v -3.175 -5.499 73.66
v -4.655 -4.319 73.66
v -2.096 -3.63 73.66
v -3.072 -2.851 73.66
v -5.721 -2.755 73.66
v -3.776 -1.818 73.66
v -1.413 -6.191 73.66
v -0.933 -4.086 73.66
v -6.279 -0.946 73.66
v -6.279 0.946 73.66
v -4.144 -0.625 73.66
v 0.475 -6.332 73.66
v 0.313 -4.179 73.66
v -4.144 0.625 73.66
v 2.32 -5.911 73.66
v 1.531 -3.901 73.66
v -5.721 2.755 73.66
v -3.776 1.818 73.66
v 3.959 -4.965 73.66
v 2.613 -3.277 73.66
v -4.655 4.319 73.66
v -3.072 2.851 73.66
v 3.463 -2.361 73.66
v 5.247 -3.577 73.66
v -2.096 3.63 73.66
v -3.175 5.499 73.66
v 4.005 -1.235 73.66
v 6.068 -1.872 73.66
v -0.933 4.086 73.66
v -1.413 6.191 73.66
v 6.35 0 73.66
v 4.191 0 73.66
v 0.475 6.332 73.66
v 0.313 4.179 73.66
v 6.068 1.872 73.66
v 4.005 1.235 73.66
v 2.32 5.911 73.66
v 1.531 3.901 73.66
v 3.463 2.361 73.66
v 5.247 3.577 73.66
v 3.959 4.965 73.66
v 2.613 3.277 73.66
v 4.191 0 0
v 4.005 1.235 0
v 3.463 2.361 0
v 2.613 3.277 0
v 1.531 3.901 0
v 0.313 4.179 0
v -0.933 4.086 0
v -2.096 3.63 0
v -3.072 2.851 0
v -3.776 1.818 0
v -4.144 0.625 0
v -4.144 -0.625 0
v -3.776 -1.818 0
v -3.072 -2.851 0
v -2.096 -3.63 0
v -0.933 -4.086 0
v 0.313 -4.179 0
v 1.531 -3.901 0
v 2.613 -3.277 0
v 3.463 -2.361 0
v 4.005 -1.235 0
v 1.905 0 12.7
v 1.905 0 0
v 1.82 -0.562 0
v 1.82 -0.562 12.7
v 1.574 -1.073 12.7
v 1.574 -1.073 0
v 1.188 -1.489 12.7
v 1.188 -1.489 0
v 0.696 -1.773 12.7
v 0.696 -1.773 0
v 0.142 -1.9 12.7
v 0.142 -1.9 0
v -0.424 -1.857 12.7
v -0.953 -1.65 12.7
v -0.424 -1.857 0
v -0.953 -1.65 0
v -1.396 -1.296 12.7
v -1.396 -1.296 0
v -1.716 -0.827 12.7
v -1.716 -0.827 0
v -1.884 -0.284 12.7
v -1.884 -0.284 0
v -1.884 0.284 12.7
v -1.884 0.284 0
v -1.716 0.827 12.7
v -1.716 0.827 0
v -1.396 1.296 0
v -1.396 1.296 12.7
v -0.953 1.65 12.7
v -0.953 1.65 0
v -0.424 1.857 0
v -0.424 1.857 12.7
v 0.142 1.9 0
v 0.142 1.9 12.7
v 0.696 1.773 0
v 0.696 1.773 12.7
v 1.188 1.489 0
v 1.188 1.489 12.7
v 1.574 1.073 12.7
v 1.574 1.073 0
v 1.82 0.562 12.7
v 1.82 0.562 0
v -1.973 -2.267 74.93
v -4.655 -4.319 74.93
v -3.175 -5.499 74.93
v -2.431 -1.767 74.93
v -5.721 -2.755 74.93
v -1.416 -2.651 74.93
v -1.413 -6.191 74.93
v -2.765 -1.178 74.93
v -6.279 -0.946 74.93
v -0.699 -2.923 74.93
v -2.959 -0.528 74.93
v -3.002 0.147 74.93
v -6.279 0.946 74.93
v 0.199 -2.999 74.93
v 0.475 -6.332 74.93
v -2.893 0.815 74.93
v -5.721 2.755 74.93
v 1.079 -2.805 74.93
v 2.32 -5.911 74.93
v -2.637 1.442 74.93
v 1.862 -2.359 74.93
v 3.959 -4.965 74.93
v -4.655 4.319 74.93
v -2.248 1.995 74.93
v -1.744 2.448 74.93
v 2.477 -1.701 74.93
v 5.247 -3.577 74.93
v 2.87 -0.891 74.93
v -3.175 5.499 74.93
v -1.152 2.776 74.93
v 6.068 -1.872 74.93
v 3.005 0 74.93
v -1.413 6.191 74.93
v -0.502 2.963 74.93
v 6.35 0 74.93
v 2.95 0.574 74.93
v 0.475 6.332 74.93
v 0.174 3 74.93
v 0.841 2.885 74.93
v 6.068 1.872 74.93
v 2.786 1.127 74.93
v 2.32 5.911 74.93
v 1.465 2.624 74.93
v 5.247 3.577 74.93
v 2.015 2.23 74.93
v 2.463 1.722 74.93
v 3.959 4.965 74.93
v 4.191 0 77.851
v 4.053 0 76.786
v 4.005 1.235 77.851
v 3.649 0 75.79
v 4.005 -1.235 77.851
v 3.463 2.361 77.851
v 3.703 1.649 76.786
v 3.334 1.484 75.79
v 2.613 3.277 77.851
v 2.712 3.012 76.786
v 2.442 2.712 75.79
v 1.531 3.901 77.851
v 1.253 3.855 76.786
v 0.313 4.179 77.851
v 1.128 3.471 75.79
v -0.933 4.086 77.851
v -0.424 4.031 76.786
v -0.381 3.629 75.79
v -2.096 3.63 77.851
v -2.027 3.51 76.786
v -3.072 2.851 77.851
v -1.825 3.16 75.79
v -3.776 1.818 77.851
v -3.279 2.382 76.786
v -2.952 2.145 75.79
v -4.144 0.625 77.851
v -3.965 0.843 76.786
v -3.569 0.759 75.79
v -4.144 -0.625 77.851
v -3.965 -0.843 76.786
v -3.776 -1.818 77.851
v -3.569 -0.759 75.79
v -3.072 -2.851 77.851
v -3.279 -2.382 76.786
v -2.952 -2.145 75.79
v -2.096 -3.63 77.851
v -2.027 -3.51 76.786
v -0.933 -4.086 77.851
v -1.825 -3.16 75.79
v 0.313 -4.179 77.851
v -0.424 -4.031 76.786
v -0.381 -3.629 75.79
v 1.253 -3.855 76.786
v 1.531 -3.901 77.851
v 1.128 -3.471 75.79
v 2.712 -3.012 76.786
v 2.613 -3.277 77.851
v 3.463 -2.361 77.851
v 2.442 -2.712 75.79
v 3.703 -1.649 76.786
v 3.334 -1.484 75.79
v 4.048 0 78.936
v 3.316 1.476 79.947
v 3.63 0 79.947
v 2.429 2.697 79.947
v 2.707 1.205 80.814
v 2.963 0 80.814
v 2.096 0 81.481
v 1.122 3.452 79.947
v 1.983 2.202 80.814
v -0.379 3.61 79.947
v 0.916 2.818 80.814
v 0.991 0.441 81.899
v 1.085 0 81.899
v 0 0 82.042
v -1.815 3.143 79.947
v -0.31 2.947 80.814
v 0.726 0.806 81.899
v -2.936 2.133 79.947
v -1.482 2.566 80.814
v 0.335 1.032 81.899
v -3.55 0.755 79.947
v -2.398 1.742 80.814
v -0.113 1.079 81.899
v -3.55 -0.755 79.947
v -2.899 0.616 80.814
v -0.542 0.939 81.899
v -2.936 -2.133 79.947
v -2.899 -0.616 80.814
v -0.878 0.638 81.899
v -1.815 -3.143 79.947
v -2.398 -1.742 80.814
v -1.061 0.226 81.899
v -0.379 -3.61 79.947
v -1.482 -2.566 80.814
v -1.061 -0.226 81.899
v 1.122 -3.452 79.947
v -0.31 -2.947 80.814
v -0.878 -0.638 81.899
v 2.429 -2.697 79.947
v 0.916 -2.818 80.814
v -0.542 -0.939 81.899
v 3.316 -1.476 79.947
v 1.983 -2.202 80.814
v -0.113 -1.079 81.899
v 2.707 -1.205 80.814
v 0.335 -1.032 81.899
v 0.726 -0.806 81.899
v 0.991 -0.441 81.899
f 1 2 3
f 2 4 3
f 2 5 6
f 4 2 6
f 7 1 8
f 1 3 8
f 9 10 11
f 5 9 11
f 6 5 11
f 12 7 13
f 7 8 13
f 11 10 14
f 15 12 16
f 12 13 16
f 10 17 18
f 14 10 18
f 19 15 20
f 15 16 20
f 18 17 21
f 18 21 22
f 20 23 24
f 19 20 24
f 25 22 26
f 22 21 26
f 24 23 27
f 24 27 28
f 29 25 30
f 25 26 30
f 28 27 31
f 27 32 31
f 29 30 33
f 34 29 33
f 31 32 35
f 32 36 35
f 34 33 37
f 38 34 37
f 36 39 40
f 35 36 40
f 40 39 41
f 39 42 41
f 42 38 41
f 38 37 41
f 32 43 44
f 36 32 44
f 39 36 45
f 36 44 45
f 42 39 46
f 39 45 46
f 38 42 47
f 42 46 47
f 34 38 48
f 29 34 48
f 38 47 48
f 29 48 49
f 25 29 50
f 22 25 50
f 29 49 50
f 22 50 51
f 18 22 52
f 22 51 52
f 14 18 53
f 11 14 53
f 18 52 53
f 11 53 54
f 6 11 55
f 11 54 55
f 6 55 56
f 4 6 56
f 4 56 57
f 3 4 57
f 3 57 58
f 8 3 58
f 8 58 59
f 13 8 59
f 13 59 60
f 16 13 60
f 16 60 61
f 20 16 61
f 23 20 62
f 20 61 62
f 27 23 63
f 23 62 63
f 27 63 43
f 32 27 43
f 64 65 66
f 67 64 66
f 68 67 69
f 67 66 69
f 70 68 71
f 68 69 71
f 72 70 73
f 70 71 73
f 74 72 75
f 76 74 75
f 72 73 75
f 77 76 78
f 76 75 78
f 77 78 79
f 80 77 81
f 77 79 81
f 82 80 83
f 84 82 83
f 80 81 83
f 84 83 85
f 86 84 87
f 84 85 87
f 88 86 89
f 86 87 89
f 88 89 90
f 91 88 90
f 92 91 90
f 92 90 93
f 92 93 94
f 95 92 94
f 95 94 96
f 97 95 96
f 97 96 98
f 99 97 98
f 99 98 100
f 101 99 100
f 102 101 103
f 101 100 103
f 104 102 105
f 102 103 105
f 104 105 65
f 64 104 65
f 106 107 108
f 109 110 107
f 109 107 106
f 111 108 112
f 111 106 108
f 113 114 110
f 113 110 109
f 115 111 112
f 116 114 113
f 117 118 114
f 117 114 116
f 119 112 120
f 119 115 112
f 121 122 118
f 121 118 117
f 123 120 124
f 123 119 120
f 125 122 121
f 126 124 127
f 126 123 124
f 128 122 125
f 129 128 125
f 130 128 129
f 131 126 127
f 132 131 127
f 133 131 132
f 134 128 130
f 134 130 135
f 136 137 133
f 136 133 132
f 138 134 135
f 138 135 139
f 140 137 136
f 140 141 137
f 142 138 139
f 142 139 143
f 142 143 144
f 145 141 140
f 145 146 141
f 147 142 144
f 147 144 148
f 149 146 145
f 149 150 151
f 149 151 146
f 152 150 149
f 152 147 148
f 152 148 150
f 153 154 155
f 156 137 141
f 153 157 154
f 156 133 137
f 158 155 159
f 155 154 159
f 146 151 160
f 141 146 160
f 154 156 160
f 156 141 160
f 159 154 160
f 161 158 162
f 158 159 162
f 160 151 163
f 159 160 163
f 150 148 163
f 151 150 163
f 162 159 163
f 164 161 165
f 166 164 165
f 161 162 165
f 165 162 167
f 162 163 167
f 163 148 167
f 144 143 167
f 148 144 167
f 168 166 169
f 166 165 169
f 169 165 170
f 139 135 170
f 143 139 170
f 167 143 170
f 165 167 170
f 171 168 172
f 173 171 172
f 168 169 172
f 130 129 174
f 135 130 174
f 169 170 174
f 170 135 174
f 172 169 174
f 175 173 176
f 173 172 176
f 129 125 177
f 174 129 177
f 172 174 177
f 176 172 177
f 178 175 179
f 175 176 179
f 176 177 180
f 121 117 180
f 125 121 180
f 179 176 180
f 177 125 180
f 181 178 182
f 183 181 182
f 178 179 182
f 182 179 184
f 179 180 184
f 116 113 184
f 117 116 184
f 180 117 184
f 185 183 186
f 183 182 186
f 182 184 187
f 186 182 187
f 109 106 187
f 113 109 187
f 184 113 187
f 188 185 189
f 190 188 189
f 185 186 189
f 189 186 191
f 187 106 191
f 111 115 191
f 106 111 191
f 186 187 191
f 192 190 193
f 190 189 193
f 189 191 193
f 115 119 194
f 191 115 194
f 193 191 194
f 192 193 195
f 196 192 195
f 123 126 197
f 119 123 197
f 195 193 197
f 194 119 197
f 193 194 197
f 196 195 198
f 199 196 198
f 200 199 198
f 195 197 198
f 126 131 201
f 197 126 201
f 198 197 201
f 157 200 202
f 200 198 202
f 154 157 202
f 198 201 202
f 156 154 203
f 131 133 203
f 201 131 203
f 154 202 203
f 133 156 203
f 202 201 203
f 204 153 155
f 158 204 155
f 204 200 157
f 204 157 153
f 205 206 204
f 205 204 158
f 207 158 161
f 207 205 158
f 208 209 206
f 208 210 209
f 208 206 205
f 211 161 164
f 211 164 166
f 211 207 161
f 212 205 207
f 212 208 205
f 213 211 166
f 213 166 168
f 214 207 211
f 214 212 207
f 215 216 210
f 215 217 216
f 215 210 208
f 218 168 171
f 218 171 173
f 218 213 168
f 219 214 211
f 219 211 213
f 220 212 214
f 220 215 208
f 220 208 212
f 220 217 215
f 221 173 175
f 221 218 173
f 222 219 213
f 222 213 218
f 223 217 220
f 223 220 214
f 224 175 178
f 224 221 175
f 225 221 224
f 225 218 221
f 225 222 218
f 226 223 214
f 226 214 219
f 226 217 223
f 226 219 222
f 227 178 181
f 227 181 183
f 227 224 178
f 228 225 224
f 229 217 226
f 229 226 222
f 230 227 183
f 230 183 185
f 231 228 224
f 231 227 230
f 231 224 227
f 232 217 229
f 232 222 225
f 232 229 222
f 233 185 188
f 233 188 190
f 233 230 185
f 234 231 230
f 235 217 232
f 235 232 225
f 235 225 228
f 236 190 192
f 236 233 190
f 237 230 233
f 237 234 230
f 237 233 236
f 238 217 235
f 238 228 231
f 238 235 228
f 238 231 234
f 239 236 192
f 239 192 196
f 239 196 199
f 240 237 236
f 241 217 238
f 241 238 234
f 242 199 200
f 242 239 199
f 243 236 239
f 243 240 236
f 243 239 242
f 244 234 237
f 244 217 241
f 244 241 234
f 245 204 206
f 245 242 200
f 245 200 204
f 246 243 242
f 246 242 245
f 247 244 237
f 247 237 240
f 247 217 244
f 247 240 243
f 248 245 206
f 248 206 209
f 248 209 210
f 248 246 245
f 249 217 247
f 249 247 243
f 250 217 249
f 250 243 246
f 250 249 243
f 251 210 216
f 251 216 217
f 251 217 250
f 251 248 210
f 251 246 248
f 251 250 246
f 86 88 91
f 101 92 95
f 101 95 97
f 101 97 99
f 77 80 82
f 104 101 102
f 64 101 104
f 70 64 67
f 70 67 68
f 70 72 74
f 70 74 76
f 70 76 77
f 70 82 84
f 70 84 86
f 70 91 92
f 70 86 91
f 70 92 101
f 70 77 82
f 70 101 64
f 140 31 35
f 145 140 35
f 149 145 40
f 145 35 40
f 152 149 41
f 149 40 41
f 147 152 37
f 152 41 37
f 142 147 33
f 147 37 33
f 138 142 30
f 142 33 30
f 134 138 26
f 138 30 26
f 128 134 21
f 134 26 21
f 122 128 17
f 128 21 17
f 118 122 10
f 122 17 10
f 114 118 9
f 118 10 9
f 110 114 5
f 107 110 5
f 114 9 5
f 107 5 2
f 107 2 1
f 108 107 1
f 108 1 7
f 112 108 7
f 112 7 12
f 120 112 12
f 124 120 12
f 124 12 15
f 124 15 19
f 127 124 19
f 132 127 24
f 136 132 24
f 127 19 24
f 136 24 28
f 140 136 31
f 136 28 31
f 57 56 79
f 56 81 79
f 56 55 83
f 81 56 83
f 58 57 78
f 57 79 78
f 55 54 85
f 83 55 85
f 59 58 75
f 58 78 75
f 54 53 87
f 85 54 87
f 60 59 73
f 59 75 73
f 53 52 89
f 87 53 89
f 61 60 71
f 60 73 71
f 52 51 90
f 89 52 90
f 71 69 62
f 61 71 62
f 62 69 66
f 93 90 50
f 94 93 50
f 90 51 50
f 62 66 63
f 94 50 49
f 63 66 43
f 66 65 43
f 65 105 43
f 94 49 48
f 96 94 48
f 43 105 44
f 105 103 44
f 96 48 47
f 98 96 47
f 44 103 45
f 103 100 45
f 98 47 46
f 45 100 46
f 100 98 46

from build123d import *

# Parameters (mm, degrees)
F0_R     = 4.191
F1_DEPTH = 73.66
F2_R     = 4.191
F3_DEPTH = 8.382
F4_R     = 4.19099
F5_R     = 6.35
F6_DEPTH = 1.27
F7_R     = 1.905
F8_DEPTH = 12.7


# Not quite as in the source:
# - a fillet or chamfer is up to 0.001 mm smaller than in the source, because OpenCascade refuses the exact size


with BuildPart() as f1:
    # F0 (on Top) → F1 (new body)
    with BuildSketch(Plane.XY):
        Circle(F0_R)
    extrude(amount=F1_DEPTH)



with BuildPart() as f3:
    # F2 (on face) → F3 (new body)
    with BuildSketch(Plane.XY.offset(73.66)):
        Circle(F2_R)
    extrude(amount=F3_DEPTH)

    # F4 (radius 4.191 in the source; OpenCascade refuses exactly that, so slightly less here)
    f4_edges = [f3.edges().sort_by_distance(p)[0] for p in [
        (-4.191, 0, 73.66),
        (-4.191, 0, 82.042),
    ]]
    fillet(f4_edges, radius=F4_R)


with BuildPart() as f1_1:
    add(f1.part)

    add(f3.part)  # F6 merges F3
    # F5 (on face) → F6 (join)
    with BuildSketch(Plane.XY.offset(73.66)):
        Circle(F5_R)
    extrude(amount=F6_DEPTH)

    # F7 (on face) → F8 (cut)
    with BuildSketch(Plane(origin=(0, 0, 0), x_dir=(1, 0, 0), z_dir=(0, 0, -1))):
        Circle(F7_R)
    extrude(amount=-F8_DEPTH, mode=Mode.SUBTRACT)


solid = f1_1.part
